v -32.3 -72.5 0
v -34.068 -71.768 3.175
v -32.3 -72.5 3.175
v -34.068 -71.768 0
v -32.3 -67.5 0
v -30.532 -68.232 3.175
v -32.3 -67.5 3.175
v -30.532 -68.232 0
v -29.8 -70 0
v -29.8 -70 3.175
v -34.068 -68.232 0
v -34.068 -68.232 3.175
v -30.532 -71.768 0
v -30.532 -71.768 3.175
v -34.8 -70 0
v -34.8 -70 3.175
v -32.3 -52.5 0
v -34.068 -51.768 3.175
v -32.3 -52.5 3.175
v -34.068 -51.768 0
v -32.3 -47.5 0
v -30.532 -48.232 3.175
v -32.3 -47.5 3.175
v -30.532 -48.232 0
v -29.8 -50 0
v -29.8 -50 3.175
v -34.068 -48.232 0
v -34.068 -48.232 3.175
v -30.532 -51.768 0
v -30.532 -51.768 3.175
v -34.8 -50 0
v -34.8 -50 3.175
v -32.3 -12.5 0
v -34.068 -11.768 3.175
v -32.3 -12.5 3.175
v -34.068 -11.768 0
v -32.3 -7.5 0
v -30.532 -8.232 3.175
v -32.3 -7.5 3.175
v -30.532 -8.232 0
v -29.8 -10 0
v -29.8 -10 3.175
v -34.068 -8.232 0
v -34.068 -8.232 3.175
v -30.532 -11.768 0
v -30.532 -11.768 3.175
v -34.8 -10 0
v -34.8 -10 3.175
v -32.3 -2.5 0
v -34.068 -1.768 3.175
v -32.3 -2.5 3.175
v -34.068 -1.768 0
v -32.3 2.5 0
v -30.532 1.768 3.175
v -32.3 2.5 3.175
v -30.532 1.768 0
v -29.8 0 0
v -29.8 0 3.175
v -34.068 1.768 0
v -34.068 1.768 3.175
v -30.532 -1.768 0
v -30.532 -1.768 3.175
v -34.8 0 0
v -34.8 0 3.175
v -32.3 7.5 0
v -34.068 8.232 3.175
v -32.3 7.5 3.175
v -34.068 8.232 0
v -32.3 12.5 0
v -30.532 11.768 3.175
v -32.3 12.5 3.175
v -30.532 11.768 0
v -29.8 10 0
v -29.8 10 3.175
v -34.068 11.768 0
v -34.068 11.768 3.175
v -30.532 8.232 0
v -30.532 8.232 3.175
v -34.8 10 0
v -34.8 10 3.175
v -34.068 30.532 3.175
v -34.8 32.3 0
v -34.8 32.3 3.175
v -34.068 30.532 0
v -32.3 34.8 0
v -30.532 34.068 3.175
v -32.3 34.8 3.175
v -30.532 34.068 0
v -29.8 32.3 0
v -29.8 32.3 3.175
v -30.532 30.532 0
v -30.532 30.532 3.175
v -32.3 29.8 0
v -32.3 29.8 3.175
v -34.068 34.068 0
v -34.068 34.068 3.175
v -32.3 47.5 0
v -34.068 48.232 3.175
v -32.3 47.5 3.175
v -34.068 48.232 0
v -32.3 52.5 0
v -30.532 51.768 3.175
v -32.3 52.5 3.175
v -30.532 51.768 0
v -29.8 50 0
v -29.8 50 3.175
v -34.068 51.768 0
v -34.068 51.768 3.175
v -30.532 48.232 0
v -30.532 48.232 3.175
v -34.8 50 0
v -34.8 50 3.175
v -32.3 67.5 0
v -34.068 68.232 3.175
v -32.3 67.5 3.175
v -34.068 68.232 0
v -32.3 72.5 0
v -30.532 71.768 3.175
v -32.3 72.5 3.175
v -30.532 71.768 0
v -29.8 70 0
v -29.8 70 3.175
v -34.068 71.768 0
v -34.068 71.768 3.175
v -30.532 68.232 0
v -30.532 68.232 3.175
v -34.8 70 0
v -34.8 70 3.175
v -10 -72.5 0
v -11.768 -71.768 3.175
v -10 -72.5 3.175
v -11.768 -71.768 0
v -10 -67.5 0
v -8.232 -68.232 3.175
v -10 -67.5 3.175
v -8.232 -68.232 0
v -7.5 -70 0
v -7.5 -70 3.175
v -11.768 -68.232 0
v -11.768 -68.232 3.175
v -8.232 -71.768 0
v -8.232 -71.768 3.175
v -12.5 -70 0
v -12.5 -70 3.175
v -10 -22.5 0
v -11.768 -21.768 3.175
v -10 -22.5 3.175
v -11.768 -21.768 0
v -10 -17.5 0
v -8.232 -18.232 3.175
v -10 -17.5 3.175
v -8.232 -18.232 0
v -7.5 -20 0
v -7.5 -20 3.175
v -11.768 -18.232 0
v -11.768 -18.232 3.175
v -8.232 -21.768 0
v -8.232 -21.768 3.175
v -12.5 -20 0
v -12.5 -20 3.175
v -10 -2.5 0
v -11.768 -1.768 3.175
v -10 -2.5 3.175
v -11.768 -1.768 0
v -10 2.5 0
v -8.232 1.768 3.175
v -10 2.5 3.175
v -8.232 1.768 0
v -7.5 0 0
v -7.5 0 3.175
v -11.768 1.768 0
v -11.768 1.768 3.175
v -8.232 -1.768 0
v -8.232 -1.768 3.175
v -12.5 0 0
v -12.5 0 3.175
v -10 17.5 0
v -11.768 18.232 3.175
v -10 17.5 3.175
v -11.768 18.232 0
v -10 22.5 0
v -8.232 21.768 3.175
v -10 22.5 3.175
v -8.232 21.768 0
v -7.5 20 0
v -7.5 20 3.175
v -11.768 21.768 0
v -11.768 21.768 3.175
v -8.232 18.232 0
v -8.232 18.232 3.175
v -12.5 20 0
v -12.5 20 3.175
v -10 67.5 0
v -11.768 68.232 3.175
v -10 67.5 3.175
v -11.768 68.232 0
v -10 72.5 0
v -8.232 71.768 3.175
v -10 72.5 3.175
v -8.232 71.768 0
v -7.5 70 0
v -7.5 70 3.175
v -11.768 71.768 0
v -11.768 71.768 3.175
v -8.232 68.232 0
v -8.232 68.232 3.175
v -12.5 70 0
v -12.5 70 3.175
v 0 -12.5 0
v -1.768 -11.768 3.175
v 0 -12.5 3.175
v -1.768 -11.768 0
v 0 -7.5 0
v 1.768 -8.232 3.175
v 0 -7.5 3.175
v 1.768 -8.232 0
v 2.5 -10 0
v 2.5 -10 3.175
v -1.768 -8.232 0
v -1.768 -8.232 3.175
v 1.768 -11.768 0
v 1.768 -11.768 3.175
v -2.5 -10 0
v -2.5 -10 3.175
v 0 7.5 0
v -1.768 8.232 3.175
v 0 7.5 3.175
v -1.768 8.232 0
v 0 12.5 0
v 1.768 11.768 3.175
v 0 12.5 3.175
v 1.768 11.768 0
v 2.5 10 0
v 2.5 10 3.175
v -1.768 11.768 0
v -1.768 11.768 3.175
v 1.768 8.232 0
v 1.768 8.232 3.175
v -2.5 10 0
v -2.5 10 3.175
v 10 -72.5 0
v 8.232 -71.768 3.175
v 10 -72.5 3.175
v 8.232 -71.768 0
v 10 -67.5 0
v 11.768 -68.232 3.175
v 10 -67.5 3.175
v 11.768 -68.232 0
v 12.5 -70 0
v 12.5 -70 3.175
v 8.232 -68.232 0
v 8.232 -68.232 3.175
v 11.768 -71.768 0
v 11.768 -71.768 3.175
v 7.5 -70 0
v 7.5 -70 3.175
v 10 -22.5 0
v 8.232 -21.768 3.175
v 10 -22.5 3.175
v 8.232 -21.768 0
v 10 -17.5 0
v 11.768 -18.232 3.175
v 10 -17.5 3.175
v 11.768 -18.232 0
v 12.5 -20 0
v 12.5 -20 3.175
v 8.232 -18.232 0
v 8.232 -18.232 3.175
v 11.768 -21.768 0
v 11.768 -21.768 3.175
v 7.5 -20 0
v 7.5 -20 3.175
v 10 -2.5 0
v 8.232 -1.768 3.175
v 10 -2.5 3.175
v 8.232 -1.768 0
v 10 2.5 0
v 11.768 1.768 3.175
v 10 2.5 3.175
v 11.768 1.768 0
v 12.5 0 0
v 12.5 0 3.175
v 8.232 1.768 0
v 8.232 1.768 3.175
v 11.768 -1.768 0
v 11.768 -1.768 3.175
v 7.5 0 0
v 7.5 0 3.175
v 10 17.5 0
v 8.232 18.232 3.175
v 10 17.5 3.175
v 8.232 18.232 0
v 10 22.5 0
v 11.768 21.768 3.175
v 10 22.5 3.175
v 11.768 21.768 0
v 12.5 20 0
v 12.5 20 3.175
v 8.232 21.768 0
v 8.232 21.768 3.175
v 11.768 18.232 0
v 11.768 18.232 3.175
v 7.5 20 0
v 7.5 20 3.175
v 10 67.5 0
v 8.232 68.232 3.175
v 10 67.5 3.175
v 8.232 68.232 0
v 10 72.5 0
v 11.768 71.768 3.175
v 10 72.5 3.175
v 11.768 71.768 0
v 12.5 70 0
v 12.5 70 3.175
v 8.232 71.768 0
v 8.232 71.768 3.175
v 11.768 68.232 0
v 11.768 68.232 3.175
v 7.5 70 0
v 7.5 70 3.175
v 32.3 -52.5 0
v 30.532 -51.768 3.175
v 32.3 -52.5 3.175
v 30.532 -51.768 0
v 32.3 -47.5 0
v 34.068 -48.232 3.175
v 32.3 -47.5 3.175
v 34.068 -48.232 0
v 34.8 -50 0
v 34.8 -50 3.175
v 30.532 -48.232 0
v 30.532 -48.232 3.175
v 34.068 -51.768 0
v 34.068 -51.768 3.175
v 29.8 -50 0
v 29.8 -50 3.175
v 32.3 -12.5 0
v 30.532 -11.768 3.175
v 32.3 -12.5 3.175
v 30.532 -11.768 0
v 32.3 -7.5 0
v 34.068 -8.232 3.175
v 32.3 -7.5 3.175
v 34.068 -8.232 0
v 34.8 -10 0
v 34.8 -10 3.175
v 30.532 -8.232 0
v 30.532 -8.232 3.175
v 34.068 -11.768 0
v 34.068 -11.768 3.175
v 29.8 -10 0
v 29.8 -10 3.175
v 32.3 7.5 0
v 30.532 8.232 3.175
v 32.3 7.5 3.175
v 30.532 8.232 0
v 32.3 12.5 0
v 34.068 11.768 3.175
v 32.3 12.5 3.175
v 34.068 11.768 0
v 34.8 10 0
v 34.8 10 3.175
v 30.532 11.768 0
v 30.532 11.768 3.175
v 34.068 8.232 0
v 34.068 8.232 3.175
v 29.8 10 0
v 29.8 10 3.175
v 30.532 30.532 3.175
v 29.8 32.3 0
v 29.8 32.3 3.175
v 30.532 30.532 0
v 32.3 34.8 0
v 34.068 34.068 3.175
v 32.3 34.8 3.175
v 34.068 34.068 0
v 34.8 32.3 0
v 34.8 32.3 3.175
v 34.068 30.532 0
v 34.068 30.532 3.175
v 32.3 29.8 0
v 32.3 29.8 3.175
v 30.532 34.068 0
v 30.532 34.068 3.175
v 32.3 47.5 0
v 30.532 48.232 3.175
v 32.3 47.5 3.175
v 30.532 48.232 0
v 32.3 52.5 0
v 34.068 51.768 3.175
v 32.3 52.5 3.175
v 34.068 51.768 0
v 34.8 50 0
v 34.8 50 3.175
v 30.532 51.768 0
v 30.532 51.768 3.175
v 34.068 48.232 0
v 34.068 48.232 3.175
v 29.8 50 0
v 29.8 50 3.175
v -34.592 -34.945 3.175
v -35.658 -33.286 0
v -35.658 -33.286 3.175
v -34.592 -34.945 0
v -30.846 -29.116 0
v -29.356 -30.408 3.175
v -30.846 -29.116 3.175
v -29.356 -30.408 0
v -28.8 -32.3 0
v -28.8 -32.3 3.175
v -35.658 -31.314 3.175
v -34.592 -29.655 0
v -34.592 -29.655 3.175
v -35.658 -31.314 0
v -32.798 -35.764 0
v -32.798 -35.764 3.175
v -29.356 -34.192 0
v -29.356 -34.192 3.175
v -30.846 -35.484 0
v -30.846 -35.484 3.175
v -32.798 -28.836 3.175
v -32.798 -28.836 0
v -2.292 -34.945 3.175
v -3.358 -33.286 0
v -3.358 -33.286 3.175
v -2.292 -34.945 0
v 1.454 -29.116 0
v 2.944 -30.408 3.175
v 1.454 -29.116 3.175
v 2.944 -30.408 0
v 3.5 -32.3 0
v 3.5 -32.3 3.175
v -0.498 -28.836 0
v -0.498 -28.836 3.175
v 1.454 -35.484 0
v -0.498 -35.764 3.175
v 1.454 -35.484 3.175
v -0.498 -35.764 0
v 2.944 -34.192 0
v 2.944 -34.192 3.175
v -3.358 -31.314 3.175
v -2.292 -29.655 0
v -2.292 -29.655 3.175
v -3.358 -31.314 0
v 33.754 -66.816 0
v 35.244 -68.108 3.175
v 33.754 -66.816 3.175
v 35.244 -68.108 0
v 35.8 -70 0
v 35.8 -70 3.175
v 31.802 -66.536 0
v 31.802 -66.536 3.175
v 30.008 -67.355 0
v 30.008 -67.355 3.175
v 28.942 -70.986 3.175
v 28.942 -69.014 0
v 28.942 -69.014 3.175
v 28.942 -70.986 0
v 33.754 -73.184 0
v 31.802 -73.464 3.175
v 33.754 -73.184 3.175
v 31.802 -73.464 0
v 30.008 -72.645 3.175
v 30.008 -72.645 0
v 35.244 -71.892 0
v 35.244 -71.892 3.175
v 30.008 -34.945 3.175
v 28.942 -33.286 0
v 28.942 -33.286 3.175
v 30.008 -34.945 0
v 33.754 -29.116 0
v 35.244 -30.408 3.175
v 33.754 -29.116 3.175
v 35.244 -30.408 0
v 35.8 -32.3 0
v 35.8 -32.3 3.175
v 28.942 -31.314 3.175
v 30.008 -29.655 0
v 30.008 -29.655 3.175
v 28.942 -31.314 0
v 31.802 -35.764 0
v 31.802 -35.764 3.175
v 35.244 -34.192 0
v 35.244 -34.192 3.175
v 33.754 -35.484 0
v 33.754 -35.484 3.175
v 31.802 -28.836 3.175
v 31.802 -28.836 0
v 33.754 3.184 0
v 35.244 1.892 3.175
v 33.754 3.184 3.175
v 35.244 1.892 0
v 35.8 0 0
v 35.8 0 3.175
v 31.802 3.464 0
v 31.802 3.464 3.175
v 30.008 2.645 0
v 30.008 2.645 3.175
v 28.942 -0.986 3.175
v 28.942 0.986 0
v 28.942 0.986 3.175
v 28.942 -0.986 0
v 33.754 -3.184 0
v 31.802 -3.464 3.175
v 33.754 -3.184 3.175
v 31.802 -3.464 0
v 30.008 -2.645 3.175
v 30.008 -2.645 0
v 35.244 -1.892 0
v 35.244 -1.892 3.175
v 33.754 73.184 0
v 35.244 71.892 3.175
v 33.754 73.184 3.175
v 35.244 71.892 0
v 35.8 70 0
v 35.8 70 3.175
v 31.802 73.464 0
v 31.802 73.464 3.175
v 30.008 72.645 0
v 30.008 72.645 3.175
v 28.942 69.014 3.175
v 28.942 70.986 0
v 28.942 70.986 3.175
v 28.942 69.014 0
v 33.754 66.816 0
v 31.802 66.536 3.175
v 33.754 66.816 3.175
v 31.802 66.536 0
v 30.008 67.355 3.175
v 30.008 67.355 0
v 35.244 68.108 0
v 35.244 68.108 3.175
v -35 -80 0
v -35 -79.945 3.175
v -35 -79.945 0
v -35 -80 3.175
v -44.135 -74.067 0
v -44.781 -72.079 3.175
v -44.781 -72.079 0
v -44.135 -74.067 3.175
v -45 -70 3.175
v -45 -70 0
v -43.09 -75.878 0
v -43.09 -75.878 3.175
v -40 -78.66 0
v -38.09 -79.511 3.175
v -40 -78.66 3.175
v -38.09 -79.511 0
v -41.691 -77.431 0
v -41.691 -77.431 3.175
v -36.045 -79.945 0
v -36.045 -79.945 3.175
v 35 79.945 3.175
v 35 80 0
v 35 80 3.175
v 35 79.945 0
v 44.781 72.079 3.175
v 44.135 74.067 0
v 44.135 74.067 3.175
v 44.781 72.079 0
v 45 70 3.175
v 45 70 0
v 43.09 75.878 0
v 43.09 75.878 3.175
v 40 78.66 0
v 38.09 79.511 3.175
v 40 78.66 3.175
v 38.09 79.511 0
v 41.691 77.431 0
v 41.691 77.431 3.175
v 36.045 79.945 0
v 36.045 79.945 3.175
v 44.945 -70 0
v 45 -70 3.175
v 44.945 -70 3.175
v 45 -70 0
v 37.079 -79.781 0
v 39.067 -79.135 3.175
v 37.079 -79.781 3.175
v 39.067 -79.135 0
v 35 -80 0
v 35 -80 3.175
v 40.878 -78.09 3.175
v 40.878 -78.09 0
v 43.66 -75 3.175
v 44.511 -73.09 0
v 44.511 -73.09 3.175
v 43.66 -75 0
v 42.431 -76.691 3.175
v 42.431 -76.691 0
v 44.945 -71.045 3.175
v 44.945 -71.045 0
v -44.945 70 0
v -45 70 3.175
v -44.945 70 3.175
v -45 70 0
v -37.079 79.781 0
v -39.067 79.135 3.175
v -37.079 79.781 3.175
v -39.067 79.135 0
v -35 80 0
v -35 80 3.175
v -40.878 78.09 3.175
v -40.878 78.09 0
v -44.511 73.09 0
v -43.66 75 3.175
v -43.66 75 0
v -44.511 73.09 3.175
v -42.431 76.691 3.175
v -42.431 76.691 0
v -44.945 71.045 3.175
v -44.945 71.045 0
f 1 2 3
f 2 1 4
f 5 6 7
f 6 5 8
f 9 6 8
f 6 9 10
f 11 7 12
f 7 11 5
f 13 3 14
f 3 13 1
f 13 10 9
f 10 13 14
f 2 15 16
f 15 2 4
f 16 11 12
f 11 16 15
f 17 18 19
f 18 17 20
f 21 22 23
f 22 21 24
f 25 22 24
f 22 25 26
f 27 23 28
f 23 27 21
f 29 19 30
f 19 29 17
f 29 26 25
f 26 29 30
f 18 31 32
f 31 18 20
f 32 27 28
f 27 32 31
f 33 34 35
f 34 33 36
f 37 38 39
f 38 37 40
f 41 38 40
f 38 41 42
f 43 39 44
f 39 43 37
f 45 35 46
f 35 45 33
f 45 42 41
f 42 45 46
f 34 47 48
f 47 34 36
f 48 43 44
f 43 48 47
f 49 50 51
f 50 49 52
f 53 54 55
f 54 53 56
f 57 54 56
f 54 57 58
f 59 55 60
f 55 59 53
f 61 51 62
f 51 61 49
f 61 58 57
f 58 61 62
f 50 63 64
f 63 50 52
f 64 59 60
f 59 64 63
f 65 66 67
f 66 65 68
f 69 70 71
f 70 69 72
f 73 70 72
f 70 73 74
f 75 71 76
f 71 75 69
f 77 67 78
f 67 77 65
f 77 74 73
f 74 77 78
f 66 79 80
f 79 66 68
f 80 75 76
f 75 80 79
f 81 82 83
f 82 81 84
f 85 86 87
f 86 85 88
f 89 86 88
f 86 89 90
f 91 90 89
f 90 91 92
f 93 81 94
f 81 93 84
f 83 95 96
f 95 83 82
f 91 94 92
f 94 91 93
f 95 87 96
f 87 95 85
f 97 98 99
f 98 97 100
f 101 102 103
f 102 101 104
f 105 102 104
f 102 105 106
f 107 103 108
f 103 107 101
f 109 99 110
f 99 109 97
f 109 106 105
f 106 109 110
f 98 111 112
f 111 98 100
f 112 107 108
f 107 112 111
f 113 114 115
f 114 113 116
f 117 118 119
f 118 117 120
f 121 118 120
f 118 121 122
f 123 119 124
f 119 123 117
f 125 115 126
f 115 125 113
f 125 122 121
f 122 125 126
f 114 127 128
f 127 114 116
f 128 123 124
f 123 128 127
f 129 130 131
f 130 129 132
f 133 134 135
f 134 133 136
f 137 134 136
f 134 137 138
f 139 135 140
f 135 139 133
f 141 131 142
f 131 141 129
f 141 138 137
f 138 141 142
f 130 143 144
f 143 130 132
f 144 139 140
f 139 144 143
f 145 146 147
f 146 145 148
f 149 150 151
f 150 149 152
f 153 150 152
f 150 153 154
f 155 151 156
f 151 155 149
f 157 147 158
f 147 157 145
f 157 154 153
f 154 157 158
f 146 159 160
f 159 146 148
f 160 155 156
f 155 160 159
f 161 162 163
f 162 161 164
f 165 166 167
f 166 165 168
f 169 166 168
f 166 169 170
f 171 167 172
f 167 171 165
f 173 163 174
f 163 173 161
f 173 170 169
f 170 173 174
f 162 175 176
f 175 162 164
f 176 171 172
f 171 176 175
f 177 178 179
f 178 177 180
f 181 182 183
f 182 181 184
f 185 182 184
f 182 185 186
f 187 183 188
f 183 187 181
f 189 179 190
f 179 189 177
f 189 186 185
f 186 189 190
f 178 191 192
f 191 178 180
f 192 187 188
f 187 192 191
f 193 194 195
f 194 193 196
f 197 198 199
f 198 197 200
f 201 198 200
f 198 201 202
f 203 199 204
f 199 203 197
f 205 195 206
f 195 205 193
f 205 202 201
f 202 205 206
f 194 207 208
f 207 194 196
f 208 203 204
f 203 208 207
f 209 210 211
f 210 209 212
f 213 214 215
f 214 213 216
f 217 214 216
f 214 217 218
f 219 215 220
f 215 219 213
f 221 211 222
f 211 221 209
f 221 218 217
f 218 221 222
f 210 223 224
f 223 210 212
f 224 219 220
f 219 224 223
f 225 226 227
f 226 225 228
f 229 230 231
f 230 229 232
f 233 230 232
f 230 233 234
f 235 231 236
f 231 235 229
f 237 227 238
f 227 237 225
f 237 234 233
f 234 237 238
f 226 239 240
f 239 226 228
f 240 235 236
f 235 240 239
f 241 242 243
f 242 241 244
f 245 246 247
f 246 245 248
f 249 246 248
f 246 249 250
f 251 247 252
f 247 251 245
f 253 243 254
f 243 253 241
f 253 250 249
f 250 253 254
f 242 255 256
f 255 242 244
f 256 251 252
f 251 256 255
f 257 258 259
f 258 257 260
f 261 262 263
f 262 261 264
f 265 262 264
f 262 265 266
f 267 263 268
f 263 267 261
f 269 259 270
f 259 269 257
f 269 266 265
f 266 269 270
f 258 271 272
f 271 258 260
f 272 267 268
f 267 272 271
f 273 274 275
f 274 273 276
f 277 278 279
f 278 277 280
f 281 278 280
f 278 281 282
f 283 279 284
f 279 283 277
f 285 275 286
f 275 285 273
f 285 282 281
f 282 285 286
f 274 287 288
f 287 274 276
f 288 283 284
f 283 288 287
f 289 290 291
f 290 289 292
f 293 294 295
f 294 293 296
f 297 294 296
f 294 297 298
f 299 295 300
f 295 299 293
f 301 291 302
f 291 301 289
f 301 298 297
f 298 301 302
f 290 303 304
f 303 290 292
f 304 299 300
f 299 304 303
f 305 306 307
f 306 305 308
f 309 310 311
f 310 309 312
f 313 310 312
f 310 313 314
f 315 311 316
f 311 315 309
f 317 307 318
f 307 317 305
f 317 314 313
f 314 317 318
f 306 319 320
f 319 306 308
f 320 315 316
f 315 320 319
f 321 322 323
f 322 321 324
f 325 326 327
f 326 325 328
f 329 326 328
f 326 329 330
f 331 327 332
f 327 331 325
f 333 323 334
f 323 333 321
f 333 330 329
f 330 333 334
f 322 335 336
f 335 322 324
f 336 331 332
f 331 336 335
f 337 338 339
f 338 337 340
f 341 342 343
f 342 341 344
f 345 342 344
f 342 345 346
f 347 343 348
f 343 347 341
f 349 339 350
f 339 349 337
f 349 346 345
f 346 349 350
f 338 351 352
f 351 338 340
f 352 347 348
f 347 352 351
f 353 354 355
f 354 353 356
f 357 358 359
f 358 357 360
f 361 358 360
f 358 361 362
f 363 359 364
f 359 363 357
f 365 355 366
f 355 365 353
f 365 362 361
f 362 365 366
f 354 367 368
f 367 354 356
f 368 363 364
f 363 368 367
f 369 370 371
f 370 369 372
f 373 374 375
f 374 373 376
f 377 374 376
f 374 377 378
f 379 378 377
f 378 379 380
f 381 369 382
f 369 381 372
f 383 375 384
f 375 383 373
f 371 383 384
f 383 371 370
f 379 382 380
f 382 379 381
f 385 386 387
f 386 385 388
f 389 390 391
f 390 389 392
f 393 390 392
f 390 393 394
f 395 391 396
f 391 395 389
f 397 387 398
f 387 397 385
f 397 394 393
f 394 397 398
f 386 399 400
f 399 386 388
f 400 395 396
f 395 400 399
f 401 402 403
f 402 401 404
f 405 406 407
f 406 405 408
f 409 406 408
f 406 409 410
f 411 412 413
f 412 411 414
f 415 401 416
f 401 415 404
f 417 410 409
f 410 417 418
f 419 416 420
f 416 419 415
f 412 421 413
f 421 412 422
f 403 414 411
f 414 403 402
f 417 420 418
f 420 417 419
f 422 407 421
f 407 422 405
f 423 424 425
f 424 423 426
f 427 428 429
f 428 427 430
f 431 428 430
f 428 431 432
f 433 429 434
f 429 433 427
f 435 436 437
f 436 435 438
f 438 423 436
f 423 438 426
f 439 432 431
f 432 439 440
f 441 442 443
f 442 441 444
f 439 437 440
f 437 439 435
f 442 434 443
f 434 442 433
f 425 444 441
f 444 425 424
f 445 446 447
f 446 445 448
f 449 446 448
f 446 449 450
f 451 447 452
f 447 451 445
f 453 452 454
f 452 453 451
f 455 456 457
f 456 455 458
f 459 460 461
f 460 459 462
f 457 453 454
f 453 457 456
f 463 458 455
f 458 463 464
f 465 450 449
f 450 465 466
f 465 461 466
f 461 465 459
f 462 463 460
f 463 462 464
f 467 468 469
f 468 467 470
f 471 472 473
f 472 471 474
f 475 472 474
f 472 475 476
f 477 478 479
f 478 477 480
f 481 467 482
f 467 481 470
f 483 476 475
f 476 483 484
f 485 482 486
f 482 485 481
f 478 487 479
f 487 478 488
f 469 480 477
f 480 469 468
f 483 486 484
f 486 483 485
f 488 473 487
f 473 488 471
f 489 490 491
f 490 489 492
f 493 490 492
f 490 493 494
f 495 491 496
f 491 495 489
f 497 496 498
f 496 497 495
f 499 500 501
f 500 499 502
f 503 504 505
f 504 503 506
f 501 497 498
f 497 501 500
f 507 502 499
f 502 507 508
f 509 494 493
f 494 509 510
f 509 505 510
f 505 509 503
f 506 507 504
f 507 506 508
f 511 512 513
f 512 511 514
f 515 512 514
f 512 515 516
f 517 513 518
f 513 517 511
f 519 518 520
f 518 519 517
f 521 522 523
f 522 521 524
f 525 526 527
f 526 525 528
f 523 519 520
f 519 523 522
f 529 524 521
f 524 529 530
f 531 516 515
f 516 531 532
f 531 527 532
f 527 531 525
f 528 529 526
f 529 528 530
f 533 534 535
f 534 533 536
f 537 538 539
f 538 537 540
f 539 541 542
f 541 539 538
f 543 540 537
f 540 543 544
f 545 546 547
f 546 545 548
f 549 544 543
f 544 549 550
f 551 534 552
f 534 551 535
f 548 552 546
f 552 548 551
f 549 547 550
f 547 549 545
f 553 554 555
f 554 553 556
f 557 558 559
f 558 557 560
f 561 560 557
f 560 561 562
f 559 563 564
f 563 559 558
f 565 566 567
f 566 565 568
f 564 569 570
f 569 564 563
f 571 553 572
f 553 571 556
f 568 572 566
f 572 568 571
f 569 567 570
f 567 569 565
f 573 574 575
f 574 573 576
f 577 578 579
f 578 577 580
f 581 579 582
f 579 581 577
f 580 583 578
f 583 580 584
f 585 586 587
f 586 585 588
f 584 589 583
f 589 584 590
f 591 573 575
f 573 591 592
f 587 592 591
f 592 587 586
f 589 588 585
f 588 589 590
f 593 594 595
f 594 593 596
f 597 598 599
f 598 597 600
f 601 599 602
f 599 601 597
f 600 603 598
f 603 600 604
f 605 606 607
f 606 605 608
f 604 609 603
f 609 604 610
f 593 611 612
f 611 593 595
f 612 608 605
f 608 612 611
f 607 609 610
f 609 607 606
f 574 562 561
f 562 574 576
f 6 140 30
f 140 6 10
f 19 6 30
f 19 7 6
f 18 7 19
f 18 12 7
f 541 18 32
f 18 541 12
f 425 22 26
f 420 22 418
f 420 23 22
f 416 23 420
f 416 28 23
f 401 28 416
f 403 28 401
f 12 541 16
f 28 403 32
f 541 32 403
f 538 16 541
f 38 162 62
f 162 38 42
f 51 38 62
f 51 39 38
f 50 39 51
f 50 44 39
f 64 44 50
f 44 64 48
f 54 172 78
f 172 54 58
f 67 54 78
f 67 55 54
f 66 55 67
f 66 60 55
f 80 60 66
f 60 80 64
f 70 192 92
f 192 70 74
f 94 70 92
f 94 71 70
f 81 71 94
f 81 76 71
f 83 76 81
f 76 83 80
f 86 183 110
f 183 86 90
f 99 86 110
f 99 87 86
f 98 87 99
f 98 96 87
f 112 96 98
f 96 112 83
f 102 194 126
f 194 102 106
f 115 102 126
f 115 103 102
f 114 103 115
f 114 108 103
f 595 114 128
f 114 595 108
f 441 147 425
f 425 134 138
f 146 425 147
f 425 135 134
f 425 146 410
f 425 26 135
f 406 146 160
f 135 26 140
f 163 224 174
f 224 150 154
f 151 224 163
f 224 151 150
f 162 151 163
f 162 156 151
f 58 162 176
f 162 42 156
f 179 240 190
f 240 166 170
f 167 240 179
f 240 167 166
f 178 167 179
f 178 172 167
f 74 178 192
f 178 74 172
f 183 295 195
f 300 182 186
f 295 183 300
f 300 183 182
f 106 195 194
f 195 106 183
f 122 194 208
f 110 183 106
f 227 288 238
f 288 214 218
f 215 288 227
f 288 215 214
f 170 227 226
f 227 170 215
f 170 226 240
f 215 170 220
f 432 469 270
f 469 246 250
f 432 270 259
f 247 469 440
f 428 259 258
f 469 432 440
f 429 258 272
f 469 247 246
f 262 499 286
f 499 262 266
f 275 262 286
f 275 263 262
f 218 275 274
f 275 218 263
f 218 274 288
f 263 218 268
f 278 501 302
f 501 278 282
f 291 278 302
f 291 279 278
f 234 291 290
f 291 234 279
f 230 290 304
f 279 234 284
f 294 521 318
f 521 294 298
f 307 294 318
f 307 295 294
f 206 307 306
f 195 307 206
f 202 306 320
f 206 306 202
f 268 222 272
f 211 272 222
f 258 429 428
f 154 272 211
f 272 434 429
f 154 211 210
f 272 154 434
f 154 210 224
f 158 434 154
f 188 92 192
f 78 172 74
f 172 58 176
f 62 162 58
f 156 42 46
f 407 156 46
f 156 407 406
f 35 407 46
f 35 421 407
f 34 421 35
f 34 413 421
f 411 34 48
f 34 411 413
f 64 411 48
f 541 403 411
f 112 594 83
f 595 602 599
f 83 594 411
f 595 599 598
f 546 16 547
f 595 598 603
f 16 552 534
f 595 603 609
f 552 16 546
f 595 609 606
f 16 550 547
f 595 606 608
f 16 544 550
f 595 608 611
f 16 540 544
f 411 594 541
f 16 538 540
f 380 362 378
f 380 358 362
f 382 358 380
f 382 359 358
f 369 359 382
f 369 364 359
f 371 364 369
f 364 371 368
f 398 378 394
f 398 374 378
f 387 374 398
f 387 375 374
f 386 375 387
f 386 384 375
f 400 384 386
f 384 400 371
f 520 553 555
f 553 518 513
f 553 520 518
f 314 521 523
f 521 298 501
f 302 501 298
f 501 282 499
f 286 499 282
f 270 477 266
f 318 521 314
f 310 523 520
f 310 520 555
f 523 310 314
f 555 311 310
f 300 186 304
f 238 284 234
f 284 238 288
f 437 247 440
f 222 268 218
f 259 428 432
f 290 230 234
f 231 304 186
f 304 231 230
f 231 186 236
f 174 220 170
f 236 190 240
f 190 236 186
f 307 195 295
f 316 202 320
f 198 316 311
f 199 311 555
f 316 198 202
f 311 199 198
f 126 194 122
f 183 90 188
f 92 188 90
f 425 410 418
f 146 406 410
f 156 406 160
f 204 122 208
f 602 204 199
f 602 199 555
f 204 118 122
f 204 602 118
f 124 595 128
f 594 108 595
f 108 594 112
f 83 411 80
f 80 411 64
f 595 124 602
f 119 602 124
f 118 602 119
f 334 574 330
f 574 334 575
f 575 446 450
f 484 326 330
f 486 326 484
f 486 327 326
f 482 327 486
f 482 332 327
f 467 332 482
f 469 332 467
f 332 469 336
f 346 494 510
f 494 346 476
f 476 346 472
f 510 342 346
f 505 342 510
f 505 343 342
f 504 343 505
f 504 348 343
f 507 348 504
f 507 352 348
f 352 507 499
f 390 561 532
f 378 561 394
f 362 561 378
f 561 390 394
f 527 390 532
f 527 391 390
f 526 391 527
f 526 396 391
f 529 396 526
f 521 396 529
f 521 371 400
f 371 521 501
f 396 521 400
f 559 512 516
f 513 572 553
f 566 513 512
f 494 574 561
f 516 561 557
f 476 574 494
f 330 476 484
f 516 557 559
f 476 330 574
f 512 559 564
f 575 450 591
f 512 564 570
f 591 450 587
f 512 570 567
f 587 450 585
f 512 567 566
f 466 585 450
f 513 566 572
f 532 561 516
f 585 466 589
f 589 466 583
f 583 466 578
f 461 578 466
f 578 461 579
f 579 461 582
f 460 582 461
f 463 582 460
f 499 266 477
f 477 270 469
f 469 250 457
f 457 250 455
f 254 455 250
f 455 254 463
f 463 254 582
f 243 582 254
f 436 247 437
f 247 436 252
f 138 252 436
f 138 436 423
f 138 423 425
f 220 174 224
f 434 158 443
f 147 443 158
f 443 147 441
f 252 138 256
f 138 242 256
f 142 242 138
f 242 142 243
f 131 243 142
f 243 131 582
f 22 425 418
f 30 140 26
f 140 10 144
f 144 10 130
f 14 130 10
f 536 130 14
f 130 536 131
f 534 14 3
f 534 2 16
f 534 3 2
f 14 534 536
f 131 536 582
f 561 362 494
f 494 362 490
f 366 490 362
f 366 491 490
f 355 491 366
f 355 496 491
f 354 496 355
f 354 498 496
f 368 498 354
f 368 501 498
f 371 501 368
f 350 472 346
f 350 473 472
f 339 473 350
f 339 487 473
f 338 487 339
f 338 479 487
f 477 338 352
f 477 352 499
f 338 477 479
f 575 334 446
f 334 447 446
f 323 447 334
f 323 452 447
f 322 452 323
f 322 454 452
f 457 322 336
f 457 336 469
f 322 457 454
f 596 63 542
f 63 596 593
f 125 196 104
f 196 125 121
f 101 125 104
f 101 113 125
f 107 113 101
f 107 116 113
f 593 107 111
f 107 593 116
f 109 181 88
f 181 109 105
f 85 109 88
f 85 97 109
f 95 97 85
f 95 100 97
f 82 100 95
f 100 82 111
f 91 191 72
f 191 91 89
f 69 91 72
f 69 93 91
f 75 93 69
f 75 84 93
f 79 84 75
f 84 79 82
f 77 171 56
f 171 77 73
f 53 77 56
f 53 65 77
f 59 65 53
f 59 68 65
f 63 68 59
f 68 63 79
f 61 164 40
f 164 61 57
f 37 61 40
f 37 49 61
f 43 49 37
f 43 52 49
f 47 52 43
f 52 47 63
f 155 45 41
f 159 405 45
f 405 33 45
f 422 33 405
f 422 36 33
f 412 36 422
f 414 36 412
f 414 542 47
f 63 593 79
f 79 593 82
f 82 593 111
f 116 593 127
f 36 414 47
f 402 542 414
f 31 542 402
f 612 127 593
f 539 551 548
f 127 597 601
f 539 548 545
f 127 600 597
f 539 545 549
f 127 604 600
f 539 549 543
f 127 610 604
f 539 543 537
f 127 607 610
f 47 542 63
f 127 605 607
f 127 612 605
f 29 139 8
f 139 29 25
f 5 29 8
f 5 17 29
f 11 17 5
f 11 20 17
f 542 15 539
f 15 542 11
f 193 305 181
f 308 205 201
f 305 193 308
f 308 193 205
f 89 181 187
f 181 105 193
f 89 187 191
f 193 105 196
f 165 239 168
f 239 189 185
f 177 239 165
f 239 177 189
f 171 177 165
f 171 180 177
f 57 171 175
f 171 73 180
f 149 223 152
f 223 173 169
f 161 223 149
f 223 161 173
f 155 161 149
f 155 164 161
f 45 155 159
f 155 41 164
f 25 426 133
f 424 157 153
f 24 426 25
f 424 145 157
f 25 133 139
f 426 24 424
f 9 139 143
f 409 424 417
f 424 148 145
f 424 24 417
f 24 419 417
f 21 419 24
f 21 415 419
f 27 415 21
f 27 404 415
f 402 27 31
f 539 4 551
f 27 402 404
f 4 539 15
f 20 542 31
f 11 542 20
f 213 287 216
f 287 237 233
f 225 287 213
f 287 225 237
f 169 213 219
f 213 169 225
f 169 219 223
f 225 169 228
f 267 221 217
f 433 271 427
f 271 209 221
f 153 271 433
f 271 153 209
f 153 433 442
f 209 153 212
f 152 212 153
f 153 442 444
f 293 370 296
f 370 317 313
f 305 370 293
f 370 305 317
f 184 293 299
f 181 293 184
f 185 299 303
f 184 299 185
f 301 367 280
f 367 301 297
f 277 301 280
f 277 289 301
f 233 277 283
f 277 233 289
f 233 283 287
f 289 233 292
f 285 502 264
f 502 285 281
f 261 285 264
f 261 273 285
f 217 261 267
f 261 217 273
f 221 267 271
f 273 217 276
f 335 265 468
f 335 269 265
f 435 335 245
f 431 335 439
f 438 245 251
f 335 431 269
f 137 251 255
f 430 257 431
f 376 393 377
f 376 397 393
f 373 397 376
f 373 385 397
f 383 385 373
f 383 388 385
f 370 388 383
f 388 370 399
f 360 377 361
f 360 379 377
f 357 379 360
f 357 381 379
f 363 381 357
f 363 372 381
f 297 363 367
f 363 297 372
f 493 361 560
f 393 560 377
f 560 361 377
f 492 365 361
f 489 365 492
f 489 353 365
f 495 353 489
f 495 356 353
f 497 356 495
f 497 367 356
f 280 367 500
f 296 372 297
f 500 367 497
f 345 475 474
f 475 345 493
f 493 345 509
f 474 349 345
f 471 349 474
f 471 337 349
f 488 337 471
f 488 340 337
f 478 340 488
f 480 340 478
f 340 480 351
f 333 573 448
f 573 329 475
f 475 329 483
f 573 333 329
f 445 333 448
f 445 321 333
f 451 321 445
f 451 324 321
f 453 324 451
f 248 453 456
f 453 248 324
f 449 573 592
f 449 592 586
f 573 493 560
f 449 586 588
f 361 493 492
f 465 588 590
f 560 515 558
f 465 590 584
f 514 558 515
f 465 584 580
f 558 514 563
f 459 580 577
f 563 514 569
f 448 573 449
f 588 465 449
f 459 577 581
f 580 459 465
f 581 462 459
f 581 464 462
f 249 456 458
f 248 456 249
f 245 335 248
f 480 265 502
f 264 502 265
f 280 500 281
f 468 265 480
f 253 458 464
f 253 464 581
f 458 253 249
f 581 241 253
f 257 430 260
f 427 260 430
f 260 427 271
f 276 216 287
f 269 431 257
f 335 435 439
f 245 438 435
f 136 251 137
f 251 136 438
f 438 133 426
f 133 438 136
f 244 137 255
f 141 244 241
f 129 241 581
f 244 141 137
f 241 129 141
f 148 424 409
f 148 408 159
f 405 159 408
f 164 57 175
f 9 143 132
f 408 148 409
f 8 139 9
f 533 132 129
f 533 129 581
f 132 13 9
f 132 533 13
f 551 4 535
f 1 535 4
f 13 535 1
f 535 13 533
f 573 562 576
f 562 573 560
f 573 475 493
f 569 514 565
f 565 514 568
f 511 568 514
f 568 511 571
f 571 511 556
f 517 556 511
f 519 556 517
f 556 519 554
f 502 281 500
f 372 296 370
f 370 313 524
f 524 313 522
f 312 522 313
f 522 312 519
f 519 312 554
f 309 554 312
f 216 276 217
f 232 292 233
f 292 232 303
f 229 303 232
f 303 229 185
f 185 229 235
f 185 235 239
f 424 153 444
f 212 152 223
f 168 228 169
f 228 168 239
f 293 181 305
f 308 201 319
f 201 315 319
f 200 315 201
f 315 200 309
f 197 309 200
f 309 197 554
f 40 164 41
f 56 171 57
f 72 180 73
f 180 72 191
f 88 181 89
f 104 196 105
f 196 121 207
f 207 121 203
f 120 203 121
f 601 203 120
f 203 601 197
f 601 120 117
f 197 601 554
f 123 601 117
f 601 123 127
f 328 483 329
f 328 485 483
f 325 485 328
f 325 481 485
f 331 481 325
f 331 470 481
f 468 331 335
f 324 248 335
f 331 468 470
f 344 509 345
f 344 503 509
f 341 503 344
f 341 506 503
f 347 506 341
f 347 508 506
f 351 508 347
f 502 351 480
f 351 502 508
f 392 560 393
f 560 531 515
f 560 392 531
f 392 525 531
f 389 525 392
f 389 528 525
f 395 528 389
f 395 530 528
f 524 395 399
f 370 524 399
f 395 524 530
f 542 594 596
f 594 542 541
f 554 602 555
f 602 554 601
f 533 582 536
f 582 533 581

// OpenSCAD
// MakerSlide Component
// http://www.makerslide.com
// c14005_rev_2
// Standard Wheel Carriage Plate
// Original by Barton Dring
// OpenSCAD model by Mike Sheldrake

centeredCarriagePlate();

module centeredCarriagePlate() {
	translate([-90/2,-160/2,0]) standard_wheel_carriage_plate();
}

module standard_wheel_carriage_plate(thickness=3.175) {
color([175/255,178/255,183/255])
difference() {

// 90mm by 160mm plate 
// 3.175mm thick by default,
// but you can pass a different thickness to this module
cube([90,160,3.175],center=false);

// 5mm diam. holes
for(i=[
  [12.7,10],
  [12.7,30],
  [12.7,70],
  [12.7,80],
  [12.7,90],
  [12.7,112.3],
  [12.7,130],
  [12.7,150],
  [35,10],
  [35,60],
  [35,80],
  [35,100],
  [35,150],
  [45,70],
  [45,90],
  [55,10],
  [55,60],
  [55,80],
  [55,100],
  [55,150],
  [77.3,30],
  [77.3,70],
  [77.3,90],
  [77.3,112.3],
  [77.3,130],

  //These are 5mm holes in the 7mm hole spots that we will do next.
  //For some reason including them here too makes the OpenCSG display look right.
  //Not needed for CGAL render though.
  [12.7,47.7],
  [45,47.7],
  [77.3,10],
  [77.3,47.7],
  [77.3,80],
  [77.3,150]

  ]) { translate([i[0],i[1],-0.2]) cylinder(h=thickness+1,r=5/2,center=false); }

// 7mm diam. holes 
for(i=[
  [12.7,47.7],
  [45,47.7],
  [77.3,10],
  [77.3,47.7],
  [77.3,80],
  [77.3,150]
  ]) { translate([i[0],i[1],-0.2]) cylinder(h=thickness+1,r=7/2,center=false); }

// rounded corners on plate 
for(i=[
  [0,0,0],
  [90,160,180],
  [90,0,90],
  [0,160,270]
  ]
  ) {
	translate([i[0],i[1],0]) rotate(a=[0,0,i[2]]) translate([10,10,-0.1]) rotate(a=[0,0,180]) difference() {
		cube([11,11,thickness+1],center=false);
		translate([0,0,-0.1]) cylinder(h=thickness+2,r=10,center=false);
		}
	}
}
}
